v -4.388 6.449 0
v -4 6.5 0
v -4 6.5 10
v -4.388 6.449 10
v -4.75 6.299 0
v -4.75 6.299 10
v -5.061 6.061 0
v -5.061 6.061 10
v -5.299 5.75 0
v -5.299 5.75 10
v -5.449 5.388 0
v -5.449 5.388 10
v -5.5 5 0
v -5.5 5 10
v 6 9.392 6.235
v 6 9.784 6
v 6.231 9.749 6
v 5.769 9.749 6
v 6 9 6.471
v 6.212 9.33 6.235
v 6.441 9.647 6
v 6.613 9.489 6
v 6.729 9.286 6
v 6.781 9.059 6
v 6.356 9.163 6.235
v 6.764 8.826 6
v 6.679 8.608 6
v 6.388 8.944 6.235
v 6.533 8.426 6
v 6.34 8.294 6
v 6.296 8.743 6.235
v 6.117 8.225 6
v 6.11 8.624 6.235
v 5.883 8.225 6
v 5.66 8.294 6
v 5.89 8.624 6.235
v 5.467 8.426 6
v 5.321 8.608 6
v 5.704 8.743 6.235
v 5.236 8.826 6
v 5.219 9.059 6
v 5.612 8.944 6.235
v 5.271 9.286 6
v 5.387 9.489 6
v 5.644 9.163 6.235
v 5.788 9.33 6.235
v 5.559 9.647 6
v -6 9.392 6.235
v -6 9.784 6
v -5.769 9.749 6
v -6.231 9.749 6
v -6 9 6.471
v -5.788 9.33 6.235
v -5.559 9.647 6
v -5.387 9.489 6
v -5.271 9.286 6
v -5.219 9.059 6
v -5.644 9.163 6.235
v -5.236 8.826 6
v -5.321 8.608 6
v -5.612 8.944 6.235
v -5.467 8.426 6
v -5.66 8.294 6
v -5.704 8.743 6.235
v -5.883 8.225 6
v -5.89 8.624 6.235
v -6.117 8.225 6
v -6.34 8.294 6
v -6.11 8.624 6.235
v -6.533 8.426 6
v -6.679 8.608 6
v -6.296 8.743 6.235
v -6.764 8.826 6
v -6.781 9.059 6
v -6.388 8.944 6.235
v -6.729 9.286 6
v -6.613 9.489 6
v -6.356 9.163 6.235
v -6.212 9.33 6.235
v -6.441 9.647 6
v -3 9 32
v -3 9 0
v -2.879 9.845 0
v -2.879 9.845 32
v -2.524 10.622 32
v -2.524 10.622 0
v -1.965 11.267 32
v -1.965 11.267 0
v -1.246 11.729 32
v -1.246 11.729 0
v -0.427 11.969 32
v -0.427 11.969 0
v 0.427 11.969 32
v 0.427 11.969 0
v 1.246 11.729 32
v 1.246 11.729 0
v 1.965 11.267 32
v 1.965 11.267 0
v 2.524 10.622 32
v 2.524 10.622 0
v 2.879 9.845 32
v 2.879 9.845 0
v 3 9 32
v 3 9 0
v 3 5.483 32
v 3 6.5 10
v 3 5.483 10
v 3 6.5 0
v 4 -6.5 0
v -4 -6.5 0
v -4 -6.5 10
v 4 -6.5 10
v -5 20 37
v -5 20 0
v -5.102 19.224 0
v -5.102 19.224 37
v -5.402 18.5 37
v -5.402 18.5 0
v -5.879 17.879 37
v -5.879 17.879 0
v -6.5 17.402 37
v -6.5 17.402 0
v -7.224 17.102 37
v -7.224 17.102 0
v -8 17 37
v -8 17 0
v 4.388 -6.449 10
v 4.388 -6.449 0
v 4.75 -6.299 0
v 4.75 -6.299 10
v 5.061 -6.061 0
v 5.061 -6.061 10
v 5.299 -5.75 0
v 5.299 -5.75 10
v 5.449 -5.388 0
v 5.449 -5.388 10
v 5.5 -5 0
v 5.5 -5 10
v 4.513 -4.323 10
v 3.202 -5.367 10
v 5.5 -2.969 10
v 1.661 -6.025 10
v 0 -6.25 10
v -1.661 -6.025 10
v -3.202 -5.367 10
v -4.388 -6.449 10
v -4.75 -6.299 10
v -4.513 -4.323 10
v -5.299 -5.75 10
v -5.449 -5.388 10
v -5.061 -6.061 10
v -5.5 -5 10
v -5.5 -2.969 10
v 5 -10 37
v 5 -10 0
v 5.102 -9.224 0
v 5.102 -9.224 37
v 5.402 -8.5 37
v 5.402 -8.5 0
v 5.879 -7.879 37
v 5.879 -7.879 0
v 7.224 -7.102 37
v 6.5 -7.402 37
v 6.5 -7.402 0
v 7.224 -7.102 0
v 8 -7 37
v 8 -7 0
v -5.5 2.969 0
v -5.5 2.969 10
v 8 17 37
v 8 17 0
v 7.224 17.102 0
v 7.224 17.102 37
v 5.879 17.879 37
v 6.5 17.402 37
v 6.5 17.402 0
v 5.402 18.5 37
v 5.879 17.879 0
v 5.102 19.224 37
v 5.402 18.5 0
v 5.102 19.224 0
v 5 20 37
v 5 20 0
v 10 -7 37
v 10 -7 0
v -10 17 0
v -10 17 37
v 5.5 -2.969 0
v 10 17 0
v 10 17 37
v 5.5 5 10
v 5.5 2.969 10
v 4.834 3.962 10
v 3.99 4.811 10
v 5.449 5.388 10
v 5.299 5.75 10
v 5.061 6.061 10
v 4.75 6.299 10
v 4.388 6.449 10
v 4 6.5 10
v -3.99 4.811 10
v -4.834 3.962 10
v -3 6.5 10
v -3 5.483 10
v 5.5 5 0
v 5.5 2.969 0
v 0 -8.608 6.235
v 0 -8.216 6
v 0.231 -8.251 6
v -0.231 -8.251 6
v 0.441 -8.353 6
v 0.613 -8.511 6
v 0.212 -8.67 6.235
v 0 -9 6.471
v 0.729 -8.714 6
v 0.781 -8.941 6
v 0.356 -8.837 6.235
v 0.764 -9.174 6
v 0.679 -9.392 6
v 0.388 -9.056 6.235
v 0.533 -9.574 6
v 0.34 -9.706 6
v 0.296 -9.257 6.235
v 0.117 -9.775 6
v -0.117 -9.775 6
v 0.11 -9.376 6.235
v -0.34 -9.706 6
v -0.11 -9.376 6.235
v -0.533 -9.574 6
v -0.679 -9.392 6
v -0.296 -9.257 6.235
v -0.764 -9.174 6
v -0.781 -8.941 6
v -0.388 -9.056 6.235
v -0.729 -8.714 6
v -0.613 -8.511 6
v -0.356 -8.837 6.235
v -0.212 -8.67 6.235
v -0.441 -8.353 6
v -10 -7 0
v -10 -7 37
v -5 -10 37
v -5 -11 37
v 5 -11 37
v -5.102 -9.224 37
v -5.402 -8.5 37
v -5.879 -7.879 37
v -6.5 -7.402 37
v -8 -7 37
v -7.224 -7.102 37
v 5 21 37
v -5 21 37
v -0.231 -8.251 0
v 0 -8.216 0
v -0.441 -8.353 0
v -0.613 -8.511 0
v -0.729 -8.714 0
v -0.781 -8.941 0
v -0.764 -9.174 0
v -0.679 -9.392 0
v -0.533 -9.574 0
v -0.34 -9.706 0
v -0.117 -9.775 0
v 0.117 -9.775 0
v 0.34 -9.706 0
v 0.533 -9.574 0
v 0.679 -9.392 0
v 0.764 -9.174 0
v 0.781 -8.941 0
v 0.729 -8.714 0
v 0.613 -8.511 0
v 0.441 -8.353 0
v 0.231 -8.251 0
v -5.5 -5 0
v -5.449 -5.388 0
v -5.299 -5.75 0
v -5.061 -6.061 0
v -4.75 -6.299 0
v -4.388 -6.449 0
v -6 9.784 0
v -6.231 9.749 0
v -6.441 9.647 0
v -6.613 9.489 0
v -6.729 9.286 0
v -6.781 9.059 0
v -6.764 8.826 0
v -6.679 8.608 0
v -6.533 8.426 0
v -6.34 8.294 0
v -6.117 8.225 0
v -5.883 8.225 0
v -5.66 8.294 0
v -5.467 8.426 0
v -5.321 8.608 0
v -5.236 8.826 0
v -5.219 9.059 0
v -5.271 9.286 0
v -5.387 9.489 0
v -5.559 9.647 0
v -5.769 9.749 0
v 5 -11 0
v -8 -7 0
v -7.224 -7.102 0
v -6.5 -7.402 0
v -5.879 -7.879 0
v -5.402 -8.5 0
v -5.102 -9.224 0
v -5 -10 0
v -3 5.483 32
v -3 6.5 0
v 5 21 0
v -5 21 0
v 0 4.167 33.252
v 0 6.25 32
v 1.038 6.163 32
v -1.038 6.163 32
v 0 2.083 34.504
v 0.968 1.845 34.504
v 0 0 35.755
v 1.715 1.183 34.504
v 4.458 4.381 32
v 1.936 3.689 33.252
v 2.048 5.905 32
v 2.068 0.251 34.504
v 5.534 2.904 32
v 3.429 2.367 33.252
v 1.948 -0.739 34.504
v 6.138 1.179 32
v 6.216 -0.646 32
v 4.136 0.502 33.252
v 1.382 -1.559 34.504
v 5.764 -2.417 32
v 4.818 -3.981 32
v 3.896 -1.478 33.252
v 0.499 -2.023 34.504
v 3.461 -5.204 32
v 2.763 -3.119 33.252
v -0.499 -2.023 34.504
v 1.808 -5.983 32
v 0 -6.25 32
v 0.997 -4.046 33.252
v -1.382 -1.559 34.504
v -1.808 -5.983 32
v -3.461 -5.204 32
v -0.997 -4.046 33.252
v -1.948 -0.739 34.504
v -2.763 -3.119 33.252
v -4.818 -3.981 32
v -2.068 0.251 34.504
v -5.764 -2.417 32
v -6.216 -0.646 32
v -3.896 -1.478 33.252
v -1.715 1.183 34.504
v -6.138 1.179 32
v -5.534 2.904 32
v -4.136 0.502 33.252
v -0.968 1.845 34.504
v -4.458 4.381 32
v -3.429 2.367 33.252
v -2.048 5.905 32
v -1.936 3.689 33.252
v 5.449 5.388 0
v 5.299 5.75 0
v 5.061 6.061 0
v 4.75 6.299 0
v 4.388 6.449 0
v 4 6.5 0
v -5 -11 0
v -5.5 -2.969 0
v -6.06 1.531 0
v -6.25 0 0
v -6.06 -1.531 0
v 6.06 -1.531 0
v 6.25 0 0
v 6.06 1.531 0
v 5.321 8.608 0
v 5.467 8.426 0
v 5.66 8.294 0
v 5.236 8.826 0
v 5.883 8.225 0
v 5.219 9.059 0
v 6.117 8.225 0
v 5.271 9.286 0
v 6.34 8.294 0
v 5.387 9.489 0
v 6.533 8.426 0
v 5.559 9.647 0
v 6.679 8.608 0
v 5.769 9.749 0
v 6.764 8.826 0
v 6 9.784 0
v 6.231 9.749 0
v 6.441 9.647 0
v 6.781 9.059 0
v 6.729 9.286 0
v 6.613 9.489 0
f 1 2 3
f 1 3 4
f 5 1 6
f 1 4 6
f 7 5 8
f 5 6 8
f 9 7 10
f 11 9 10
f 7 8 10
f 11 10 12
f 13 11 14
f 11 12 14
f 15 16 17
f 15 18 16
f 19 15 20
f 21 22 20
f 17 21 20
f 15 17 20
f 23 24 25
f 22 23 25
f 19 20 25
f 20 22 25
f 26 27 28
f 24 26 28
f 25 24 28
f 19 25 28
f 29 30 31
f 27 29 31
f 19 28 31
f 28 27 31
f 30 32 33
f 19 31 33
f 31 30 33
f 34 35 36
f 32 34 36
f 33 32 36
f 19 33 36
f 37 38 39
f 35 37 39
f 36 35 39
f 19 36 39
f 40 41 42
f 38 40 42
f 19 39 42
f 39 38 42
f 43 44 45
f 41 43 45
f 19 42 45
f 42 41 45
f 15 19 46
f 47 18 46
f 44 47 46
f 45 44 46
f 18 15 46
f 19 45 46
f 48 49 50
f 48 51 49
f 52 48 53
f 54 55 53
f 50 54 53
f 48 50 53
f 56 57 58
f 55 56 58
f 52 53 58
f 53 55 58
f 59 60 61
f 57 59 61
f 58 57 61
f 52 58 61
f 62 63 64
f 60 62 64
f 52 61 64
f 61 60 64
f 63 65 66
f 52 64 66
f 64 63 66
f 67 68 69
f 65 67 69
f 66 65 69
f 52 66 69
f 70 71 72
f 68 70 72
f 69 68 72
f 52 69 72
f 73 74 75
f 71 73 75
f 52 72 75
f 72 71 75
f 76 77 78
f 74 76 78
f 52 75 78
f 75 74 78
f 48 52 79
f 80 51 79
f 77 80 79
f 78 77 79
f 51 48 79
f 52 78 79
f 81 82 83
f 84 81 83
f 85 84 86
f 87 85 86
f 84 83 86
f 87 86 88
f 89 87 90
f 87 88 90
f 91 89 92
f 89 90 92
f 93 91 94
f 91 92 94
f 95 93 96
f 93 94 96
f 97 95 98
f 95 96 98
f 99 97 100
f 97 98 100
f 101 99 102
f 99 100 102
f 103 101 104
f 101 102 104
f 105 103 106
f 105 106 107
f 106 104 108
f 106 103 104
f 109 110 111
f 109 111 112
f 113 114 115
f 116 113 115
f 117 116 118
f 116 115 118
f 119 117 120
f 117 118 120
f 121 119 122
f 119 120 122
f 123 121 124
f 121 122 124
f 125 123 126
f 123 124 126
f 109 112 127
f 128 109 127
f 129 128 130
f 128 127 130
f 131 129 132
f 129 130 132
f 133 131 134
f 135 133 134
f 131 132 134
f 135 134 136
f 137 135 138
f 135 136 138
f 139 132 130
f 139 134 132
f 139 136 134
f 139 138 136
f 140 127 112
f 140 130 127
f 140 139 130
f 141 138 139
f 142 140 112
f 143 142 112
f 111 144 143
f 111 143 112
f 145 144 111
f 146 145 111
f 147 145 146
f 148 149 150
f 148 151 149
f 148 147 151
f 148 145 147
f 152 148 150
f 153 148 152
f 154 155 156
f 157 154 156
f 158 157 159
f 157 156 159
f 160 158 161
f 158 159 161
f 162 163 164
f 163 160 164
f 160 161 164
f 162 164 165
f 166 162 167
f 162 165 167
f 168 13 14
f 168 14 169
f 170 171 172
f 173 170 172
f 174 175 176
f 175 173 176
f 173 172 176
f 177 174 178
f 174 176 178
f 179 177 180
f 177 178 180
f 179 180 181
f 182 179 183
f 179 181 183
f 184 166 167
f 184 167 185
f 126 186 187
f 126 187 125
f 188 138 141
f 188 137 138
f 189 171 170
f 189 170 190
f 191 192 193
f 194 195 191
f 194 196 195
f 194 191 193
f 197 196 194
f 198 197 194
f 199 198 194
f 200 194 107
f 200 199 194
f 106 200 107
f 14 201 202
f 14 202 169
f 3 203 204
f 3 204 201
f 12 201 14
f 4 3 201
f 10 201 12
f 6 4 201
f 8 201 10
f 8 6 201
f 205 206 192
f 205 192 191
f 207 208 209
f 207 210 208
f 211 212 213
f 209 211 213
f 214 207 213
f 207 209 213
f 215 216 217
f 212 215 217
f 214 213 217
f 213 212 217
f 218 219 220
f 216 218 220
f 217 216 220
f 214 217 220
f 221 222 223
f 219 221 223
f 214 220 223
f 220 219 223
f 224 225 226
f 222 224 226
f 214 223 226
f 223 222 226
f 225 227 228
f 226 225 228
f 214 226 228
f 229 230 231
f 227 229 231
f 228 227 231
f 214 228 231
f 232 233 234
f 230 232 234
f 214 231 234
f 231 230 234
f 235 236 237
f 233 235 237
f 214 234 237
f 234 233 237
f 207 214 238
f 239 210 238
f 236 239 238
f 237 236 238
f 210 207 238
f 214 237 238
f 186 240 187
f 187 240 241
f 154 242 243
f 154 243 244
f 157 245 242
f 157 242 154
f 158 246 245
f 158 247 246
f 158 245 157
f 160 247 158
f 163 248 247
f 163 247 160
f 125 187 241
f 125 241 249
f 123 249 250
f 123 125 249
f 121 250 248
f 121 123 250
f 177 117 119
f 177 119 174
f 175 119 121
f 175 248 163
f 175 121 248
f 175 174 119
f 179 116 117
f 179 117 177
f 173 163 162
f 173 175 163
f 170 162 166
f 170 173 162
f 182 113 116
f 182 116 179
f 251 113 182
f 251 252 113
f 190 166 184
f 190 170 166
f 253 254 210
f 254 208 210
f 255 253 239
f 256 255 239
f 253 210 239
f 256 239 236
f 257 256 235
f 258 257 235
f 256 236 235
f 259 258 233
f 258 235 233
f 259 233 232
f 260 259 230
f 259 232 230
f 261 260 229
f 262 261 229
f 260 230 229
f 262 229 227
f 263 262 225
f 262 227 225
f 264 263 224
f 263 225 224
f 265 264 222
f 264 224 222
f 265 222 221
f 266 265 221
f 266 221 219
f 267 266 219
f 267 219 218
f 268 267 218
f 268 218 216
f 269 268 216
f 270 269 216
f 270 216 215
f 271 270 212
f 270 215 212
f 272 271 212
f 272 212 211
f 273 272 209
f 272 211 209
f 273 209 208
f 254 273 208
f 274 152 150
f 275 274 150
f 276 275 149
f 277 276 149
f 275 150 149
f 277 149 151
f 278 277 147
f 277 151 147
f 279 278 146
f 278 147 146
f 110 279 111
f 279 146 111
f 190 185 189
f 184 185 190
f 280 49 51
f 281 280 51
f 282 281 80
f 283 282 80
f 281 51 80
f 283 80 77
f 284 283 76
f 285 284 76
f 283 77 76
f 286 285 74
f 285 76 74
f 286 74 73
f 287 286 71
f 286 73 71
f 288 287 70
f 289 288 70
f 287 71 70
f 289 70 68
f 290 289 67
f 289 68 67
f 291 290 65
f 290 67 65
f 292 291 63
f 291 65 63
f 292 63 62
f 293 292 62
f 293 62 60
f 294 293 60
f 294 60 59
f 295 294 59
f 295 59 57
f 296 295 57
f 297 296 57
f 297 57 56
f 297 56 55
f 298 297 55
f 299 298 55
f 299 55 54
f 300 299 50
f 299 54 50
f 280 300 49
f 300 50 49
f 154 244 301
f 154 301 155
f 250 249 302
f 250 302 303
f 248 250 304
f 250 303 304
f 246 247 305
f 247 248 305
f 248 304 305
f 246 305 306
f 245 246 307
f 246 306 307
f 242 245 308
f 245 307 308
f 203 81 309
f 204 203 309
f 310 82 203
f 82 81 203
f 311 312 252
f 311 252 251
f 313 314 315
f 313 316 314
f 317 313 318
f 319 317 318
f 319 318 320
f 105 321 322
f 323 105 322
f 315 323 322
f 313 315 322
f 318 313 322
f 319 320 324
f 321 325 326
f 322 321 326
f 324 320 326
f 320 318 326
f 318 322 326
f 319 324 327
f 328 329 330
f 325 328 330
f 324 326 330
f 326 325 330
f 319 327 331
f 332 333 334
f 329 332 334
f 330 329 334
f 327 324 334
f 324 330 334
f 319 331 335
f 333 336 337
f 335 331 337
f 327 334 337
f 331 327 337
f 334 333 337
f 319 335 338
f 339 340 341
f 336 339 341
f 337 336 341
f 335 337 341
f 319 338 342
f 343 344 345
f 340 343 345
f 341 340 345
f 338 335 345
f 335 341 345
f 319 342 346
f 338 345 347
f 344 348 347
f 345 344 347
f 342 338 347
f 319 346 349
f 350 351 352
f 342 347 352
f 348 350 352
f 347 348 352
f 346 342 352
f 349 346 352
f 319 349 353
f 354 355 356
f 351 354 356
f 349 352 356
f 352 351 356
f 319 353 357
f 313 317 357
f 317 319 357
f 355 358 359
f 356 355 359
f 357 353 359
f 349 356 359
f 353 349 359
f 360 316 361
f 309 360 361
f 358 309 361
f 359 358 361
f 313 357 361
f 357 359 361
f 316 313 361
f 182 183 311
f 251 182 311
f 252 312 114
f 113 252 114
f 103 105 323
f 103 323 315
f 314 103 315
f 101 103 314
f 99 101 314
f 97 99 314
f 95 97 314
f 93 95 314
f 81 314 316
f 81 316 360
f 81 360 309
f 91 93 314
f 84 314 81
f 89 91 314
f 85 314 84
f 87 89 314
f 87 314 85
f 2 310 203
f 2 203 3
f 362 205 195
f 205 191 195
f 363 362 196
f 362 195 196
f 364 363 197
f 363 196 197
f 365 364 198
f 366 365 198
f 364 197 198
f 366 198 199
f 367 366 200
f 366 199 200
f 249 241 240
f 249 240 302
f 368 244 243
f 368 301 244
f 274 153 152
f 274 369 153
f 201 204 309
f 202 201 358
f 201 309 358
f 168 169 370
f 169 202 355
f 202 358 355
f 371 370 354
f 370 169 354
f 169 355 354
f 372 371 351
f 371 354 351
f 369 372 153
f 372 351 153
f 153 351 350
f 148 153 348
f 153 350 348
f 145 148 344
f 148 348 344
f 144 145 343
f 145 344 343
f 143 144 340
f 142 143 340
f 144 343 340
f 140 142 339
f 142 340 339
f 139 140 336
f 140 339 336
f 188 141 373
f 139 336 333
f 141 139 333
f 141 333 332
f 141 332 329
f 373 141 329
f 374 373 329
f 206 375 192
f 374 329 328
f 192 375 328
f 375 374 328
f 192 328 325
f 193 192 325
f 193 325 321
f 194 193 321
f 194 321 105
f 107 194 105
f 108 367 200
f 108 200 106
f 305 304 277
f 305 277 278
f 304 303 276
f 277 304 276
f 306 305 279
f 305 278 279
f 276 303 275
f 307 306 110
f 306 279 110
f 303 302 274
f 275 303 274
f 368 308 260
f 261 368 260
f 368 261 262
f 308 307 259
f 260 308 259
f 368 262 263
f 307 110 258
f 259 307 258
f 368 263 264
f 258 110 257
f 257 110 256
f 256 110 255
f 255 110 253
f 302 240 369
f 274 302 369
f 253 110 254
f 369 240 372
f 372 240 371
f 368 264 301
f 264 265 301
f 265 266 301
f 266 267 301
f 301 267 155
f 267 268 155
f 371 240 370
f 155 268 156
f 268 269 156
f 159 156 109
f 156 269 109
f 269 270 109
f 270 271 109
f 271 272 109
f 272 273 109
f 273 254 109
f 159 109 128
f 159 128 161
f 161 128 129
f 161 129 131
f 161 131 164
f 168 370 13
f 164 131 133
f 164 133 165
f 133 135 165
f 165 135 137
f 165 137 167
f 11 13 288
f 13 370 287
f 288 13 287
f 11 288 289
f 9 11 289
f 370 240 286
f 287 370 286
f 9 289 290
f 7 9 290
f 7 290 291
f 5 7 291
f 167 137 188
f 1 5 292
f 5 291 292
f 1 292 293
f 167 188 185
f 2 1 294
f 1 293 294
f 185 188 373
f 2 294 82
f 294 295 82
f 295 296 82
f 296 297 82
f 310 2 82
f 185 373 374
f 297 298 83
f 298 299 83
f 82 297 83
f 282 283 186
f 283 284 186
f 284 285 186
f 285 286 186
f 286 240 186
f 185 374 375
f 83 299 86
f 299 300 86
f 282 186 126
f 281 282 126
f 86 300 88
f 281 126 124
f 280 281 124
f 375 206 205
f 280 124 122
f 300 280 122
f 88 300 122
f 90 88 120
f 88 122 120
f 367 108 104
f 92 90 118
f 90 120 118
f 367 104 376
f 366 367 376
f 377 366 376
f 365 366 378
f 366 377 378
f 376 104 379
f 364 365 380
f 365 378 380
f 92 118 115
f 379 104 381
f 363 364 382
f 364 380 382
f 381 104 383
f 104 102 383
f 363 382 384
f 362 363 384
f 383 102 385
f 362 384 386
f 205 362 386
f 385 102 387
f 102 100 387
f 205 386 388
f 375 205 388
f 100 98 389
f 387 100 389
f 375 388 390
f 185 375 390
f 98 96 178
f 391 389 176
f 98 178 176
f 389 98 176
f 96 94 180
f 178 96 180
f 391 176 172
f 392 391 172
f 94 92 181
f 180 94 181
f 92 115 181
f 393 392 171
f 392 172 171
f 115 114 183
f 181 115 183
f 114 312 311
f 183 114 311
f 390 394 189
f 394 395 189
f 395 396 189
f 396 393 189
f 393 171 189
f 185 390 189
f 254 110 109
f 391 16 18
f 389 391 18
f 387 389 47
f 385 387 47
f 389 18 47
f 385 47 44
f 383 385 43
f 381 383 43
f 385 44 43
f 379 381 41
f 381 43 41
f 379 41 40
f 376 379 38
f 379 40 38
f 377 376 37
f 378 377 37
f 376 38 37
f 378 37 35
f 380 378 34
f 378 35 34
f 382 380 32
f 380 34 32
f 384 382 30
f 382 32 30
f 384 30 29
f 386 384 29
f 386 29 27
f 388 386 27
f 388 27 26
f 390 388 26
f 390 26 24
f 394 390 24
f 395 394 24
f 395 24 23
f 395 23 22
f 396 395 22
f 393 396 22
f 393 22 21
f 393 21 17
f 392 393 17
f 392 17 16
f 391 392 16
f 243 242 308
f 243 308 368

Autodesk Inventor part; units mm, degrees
ref_plane "YZ Plane" through (0, 0, 0) normal (1, 0, 0) x (0, 1, 0)
ref_plane "XZ Plane" through (0, 0, 0) normal (0, 1, 0) x (-1, 0, 0)
ref_plane "XY Plane" through (0, 0, 0) normal (0, 0, 1) x (1, 0, 0)
sketch "Skizze1" plane through (0, 0, 0) normal (0, 0, 1) x (1, 0, 0)
  line L0 (-14, 0) -> (14, 0) projected
  line L1 (0, -15.4) -> (0, 15.4) projected
  line L2 (-10, 11) -> (10, 11)
  line L3 (10, 11) -> (10, -11)
  line L4 (10, -11) -> (-10, -11)
  line L5 (-10, -11) -> (-10, 11)
  point P0 (0, 0)
  dimension "d0" = 22
  dimension "d1" = 20
extrude "Extrusion1" add sketch "Skizze1" along normal blind 37
sketch "Skizze2" plane through (0, 0, 0) normal (0, 0, -1) x (-1, 0, 0)
  point P0 (0, 0)
hole "Bohrung1" at (0, 0, 0) direction (0, 0, 1) diameter 12.5 depth 32 tip angle 118
sketch "Skizze3" plane through (0, 0, 0) normal (0, 0, -1) x (-1, 0, 0)
  line L0 (14, 0) -> (-14, 0) projected
  line L1 (0, -15.4) -> (0, 15.4) projected
  line L2 (-5.5, 6.5) -> (5.5, 6.5)
  line L3 (5.5, 6.5) -> (5.5, -6.5)
  line L4 (5.5, -6.5) -> (-5.5, -6.5)
  line L5 (-5.5, -6.5) -> (-5.5, 6.5)
  dimension "d11" = 13
  dimension "d12" = 11
extrude "Extrusion2" cut sketch "Skizze3" against normal blind 10
fillet "Rundung1" radius 1.5 4 edges at (-5.5, -6.5, 5) (-5.5, 6.5, 5) (5.5, 6.5, 5) (5.5, -6.5, 5)
sketch "Skizze4" plane through (0, 0, 37) normal (0, 0, 1) x (1, 0, 0)
  line L0 (-10, 11) -> (-10, -11) projected
  line L1 (-10, -11) -> (10, -11) projected
  line L2 (-4, -6.5) -> (4, -6.5) projected
  arc A0 (4, -6.5) -> (5.5, -5) centre (4, -5) ccw projected
  line L3 (5.5, -5) -> (5.5, -2.9686) projected
  arc A1 (-5.5, -5) -> (-4, -6.5) centre (-4, -5) ccw projected
  line L4 (-5.5, -2.9686) -> (-5.5, -5) projected
  line L5 (-10, -7) -> (-5, -7)
  line L6 (-5, -7) -> (-5, -11)
  line L7 (-5, -11) -> (-10, -11)
  line L8 (-10, -11) -> (-10, -7)
  line L9 (10, -11) -> (5, -11)
  line L10 (5, -11) -> (5, -7)
  line L11 (5, -7) -> (10, -7)
  line L12 (10, -7) -> (10, -11)
  point P0 (0, 0)
  dimension "d16" = 5
  dimension "d17" = 4
  dimension "d18" = 5
extrude "Extrusion3" cut sketch "Skizze4" against normal through all
fillet "Rundung2" radius 3 2 edges at (-5, -7, 18.5) (5, -7, 18.5)
sketch "Skizze5" plane through (-10, 11, 0) normal (0, 1, 0) x (1, 0, 0)
  line L0 (0, 0) -> (20, 0) projected
  line L1 (0, 0) -> (20, 0)
  line L2 (20, 0) -> (20, -10)
  line L3 (20, -10) -> (0, -10)
  line L4 (0, -10) -> (0, 0)
  line L5 (-4, 0) -> (24, 0) projected
  line L6 (10, 7.4) -> (10, -44.4) projected
  point P0 (10, 0)
  dimension "d22" = 20
  dimension "d23" = 10
extrude "Extrusion4" add sketch "Skizze5" along normal blind 10
sketch "Skizze7" plane through (0, 0, 0) normal (0, 0, -1) x (-1, 0, 0)
  circle A0 centre (-6, 9) radius 1.2 projected
  circle A1 centre (6, 9) radius 1.2 projected
  circle A2 centre (0, -9) radius 1.2 projected
hole "Bohrung3" at (6, 9, 0) at (-6, 9, 0) at (0, -9, 0) direction (0, 0, 1) diameter 1.567 depth 6 tip angle 118 thread size "M2x0.4" class "6H" standard "ISO Metric profile"
sketch "Skizze8" plane through (-10, 11, 37) normal (0, 1, 0) x (1, 0, 0)
  line L0 (20, 27) -> (0, 27) projected
  line L1 (0, 27) -> (0, 0) projected
  line L2 (20, 0) -> (0, 0) projected
  line L3 (20, 27) -> (20, 0) projected
  point P0 (10, 37)
extrude "Extrusion5" add sketch "Skizze8" along normal blind 6
sketch "Skizze9" plane through (-10, 21, 10) normal (0, 0, 1) x (1, 0, 0)
  line L0 (20, -4) -> (20, 0) projected
  line L1 (0, 0) -> (20, 0) projected
  circle A0 centre (4, -12) radius 1.2 projected
  circle A1 centre (16, -12) radius 1.2 projected
  circle A2 centre (10, -30) radius 1.2 projected
  circle A3 centre (18, -1) radius 2.25 projected
  circle A4 centre (18, -31) radius 2.25 projected
  circle A5 centre (2, -31) radius 2.25 projected
  circle A6 centre (2, -1) radius 2.25 projected
  circle A7 centre (13, -17) radius 1.75 projected
  circle A8 centre (7, -25) radius 1.75 projected
  circle A9 centre (10, -25.5) radius 0.9 projected
  circle A10 centre (10, -16.5) radius 0.9 projected
  circle A11 centre (10, -21) radius 3 projected
  line L2 (23, 2) -> (-3, 2) projected
  line L3 (-3, 2) -> (-3, -34) projected
  line L4 (-3, -34) -> (23, -34) projected
  line L5 (23, 2) -> (23, -34) projected
  line L6 (15, 0) -> (20, 0)
  line L7 (20, 0) -> (20, -4)
  line L8 (20, -4) -> (15, -4)
  line L9 (15, -4) -> (15, 0)
  line L10 (0, 0) -> (5, 0)
  line L11 (5, 0) -> (5, -4)
  line L12 (5, -4) -> (0, -4)
  line L13 (0, -4) -> (0, 0)
  line L14 (10, 0) -> (10, -17.7524)
  circle A12 centre (10, -12) radius 3 projected
  point P0 (10, -21)
  dimension "d44" = 3
  dimension "d45" = 3
extrude "Extrusion6" cut sketch "Skizze9" against normal through all contours L8 L9 L1 A3 L0 | L11 L12 L13 A6 L1 | A3 L1 L0 | A6 L13 L1 picked at (17.2844, -1.2206) picked at (2.725, -1.1961)
fillet "Rundung3" radius 3 2 edges at (5, 17, 5) (-5, 17, 5)
sketch "Skizze10" plane through (0, 0, 0) normal (0, 0, -1) x (-1, 0, 0)
  line L0 (-5.5, -5) -> (-5.5, -2.9686) projected
  arc A0 (2, 11.2361) -> (-2, 11.2361) centre (0, 9) ccw projected
  arc A1 (-2, 11.2361) -> (2, 11.2361) centre (0, 9) ccw projected
  arc A2 (3, 9) -> (-3, 9) centre (0, 9) ccw
  line L1 (-3, 9) -> (-3, 4)
  line L2 (-3, 4) -> (3, 4)
  line L3 (3, 9) -> (3, 4)
  arc A3 (5.5, 2.9686) -> (-5.5, 2.9686) centre (0, 0) ccw projected
  dimension "d49" = 3
  dimension "d50" = 5
extrude "Extrusion7" cut sketch "Skizze10" against normal blind 32
sketch "Skizze11" plane through (-5, 21, 10) normal (0, 0, 1) x (1, 0, 0)
  line L0 (0, 0) -> (0, -1) projected
  arc A0 (-3, -4) -> (0, -1) centre (-3, -1) ccw projected
  line L1 (-3, -4) -> (13, -4) projected
  arc A1 (10, -1) -> (13, -4) centre (13, -1) ccw projected
  line L2 (10, -1) -> (10, 0) projected
  line L3 (0, 0) -> (10, 0) projected
  point P0 (5, -21)
extrude "Extrusion8" add sketch "Skizze11" along normal up to surface (27 mm away)
properties part number "13_1087_013" material "PPS-Kunststoff"
